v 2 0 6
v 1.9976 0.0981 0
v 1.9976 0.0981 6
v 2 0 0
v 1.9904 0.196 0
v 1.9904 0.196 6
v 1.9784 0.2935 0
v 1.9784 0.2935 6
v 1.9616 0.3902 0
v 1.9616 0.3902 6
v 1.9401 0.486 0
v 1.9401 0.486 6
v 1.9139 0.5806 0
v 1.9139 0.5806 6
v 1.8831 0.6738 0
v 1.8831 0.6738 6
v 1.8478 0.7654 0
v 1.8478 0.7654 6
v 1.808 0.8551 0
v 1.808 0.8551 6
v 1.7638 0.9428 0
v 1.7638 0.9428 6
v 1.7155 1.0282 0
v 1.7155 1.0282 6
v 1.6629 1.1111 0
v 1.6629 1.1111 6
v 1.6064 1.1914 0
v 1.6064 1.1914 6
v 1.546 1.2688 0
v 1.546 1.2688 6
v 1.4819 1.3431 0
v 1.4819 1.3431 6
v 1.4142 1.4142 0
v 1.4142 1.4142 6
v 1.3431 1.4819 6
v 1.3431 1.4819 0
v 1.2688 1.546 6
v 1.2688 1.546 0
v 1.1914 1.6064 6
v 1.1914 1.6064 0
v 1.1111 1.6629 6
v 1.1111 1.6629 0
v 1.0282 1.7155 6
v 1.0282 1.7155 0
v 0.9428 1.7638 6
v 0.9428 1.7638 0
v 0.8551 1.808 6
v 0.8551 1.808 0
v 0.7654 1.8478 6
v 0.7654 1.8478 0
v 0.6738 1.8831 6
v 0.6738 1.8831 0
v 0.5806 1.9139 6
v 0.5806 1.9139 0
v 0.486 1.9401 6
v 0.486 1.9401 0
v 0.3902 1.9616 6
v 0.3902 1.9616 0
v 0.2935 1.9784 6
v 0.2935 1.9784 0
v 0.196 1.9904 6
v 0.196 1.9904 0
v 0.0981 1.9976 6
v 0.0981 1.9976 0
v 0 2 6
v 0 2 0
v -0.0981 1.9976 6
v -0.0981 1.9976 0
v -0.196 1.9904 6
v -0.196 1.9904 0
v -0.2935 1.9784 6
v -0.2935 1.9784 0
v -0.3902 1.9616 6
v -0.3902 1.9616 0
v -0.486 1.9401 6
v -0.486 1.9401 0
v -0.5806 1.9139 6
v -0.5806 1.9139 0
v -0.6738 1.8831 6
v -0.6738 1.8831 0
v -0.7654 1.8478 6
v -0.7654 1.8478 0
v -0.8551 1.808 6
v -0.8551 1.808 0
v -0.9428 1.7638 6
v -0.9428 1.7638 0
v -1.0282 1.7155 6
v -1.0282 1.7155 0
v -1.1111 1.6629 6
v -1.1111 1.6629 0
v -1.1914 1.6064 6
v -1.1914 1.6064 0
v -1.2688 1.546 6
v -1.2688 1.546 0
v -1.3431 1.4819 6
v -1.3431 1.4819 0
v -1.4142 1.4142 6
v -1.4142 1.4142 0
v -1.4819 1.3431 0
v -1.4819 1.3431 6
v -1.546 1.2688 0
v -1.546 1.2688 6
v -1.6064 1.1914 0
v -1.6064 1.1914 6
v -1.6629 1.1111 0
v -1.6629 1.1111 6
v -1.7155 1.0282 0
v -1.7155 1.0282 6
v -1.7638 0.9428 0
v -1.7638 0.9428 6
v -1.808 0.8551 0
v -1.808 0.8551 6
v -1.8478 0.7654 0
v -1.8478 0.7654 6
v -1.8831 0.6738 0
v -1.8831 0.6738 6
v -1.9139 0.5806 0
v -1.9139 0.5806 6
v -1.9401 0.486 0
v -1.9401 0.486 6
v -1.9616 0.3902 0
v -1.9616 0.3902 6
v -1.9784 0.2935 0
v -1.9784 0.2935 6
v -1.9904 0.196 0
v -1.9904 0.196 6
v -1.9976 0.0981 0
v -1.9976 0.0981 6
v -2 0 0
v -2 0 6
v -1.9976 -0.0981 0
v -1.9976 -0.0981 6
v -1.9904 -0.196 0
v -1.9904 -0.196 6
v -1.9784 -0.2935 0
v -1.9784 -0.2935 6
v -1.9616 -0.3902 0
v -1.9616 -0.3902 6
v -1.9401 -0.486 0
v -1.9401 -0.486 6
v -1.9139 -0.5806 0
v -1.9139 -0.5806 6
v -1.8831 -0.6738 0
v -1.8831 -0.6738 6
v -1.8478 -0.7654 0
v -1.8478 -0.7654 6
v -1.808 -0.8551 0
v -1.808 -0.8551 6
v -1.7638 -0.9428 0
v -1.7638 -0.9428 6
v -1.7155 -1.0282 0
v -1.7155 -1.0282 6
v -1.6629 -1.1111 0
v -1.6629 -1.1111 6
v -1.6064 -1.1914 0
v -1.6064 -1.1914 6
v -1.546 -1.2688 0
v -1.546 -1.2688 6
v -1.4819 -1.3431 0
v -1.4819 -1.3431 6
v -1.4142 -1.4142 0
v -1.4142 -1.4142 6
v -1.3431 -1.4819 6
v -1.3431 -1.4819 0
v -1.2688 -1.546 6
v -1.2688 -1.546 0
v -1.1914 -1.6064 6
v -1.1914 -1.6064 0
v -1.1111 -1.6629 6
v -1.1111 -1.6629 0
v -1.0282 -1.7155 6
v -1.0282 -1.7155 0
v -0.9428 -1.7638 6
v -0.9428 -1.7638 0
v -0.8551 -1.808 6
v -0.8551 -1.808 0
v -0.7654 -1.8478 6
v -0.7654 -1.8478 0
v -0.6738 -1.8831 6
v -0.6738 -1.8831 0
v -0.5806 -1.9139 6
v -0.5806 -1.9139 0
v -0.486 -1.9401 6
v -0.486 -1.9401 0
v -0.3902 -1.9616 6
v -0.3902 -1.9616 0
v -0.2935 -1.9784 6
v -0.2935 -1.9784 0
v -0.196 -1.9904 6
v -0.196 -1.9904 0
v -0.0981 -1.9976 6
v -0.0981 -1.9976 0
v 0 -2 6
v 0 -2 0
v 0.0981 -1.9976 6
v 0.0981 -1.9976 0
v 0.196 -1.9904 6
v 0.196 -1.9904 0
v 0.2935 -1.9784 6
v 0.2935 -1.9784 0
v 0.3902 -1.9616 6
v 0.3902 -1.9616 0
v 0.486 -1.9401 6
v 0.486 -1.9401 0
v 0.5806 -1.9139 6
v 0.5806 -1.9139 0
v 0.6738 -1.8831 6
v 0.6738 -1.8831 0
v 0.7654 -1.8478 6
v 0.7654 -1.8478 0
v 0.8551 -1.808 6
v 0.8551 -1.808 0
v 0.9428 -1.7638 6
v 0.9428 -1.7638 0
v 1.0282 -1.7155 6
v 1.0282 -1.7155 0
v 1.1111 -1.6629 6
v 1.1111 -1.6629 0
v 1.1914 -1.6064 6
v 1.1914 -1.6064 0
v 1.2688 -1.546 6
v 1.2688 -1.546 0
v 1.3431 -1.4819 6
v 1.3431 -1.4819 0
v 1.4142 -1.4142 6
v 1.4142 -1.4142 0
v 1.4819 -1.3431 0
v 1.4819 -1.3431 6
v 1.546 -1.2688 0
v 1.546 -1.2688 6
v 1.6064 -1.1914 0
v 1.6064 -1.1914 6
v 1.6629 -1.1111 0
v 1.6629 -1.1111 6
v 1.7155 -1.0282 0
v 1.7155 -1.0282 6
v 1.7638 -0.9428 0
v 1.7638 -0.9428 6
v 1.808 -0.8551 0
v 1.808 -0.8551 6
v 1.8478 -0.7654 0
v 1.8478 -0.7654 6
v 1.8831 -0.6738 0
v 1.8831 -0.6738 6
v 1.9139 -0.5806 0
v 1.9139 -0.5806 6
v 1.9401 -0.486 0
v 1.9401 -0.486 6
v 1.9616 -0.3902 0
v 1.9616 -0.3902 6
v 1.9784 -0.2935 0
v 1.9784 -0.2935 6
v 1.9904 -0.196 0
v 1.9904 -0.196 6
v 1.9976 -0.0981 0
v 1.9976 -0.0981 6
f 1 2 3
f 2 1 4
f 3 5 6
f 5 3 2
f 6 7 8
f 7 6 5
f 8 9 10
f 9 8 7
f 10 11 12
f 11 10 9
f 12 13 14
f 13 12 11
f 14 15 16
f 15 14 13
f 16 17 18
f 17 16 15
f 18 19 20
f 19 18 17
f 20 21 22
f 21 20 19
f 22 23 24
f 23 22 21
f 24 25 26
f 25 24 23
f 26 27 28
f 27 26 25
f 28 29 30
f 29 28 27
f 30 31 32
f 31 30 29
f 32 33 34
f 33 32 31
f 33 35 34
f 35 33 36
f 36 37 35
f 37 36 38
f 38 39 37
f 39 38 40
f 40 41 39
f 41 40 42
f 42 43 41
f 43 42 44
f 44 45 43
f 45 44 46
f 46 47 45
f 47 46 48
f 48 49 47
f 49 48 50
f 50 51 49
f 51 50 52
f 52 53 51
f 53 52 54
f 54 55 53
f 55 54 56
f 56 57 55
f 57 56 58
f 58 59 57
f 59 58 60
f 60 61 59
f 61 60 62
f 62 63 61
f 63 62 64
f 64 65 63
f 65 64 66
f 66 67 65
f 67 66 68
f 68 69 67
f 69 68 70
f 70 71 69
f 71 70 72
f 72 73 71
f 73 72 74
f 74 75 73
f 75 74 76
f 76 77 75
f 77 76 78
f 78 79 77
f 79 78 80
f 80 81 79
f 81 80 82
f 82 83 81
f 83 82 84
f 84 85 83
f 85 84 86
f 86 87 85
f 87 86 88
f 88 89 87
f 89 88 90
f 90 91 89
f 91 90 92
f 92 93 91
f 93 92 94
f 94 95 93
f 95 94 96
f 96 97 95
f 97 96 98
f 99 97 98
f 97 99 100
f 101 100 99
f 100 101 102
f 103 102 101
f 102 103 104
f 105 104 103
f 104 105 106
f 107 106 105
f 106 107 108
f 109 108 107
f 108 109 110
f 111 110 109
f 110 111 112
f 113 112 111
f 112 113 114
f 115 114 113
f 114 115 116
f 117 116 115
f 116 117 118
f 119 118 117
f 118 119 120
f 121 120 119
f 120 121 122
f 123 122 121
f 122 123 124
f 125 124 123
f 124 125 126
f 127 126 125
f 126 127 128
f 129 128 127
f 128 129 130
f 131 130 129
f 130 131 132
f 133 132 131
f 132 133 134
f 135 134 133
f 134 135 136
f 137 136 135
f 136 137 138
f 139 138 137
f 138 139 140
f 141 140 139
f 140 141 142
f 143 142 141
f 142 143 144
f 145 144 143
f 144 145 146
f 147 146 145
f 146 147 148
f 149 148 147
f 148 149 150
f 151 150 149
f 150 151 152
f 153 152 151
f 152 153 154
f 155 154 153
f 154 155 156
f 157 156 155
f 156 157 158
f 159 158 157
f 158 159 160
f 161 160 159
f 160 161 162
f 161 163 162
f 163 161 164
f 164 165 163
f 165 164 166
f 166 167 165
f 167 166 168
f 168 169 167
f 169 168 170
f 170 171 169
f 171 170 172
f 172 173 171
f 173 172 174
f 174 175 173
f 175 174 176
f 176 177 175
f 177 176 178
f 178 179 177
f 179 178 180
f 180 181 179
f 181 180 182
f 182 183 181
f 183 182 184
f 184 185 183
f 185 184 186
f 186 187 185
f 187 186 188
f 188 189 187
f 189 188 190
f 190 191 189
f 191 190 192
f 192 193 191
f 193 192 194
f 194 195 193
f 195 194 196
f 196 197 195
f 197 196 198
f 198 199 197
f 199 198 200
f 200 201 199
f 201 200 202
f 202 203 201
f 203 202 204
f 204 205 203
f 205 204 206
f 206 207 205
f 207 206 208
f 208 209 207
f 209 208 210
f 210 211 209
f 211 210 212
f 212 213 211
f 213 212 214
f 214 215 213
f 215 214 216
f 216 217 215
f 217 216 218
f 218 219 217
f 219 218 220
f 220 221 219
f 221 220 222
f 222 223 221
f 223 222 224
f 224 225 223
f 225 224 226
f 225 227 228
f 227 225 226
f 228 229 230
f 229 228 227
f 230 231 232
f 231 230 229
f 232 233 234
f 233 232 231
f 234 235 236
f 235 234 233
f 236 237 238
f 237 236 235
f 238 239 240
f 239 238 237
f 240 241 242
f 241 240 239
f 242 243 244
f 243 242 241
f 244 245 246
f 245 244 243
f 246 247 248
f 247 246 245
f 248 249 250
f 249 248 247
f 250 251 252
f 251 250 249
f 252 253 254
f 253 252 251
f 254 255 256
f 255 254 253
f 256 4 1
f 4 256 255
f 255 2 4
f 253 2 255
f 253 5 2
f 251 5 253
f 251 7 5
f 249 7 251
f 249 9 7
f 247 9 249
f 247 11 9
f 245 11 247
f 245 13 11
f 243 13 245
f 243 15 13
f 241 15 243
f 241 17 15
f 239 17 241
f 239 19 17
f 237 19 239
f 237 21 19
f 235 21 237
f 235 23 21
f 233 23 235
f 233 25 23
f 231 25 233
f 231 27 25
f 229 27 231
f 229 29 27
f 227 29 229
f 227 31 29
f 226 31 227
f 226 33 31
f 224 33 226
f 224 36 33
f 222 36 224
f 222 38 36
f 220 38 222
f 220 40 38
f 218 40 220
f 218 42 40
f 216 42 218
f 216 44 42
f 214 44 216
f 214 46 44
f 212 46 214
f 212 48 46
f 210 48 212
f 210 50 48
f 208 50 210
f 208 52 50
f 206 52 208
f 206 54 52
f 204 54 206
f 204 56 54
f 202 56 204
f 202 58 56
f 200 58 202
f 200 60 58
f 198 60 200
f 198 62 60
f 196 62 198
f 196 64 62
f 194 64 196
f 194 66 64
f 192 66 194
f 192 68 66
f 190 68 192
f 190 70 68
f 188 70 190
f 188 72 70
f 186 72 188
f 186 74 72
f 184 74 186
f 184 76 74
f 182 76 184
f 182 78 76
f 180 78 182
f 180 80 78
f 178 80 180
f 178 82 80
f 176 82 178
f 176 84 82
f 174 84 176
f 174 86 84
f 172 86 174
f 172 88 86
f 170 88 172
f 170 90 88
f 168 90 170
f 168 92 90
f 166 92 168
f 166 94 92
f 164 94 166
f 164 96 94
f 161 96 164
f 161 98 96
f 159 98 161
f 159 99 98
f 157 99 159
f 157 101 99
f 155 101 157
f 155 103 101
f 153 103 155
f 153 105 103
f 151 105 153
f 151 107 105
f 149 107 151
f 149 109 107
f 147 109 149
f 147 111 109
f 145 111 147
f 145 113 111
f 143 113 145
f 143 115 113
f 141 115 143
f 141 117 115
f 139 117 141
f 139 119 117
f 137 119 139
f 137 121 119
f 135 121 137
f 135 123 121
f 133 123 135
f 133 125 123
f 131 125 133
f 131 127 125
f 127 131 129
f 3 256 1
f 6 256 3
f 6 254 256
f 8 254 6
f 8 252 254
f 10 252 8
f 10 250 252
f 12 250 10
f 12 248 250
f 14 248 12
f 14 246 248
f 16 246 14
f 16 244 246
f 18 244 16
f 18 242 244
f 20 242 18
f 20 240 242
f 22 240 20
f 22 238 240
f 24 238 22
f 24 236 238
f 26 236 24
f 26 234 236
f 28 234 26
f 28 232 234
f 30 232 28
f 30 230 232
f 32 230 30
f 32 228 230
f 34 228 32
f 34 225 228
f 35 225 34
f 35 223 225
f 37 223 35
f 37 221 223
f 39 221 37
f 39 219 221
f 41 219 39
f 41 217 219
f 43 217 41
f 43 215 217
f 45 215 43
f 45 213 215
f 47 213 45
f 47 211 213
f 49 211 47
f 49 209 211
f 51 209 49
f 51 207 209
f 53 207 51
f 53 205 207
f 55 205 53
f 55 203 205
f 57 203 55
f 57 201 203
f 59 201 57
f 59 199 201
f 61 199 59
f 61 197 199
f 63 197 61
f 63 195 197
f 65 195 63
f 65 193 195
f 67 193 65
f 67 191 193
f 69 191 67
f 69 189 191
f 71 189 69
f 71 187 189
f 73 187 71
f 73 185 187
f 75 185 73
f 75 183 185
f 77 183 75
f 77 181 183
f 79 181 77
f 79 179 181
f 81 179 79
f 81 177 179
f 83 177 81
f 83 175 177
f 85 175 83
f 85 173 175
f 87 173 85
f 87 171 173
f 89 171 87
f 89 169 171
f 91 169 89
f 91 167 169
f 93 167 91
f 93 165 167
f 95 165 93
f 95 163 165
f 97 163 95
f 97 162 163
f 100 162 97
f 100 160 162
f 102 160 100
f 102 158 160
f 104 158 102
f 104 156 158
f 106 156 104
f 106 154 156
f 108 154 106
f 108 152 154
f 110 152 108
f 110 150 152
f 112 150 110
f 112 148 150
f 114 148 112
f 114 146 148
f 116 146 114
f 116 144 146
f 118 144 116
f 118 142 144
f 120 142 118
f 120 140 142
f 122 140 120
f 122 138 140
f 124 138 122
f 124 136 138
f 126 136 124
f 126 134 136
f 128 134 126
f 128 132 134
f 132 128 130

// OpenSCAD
$fn = 128;

r = 2.0;
a = 0;
h = 6;

cylinder(h = h, r = r, center = false);
